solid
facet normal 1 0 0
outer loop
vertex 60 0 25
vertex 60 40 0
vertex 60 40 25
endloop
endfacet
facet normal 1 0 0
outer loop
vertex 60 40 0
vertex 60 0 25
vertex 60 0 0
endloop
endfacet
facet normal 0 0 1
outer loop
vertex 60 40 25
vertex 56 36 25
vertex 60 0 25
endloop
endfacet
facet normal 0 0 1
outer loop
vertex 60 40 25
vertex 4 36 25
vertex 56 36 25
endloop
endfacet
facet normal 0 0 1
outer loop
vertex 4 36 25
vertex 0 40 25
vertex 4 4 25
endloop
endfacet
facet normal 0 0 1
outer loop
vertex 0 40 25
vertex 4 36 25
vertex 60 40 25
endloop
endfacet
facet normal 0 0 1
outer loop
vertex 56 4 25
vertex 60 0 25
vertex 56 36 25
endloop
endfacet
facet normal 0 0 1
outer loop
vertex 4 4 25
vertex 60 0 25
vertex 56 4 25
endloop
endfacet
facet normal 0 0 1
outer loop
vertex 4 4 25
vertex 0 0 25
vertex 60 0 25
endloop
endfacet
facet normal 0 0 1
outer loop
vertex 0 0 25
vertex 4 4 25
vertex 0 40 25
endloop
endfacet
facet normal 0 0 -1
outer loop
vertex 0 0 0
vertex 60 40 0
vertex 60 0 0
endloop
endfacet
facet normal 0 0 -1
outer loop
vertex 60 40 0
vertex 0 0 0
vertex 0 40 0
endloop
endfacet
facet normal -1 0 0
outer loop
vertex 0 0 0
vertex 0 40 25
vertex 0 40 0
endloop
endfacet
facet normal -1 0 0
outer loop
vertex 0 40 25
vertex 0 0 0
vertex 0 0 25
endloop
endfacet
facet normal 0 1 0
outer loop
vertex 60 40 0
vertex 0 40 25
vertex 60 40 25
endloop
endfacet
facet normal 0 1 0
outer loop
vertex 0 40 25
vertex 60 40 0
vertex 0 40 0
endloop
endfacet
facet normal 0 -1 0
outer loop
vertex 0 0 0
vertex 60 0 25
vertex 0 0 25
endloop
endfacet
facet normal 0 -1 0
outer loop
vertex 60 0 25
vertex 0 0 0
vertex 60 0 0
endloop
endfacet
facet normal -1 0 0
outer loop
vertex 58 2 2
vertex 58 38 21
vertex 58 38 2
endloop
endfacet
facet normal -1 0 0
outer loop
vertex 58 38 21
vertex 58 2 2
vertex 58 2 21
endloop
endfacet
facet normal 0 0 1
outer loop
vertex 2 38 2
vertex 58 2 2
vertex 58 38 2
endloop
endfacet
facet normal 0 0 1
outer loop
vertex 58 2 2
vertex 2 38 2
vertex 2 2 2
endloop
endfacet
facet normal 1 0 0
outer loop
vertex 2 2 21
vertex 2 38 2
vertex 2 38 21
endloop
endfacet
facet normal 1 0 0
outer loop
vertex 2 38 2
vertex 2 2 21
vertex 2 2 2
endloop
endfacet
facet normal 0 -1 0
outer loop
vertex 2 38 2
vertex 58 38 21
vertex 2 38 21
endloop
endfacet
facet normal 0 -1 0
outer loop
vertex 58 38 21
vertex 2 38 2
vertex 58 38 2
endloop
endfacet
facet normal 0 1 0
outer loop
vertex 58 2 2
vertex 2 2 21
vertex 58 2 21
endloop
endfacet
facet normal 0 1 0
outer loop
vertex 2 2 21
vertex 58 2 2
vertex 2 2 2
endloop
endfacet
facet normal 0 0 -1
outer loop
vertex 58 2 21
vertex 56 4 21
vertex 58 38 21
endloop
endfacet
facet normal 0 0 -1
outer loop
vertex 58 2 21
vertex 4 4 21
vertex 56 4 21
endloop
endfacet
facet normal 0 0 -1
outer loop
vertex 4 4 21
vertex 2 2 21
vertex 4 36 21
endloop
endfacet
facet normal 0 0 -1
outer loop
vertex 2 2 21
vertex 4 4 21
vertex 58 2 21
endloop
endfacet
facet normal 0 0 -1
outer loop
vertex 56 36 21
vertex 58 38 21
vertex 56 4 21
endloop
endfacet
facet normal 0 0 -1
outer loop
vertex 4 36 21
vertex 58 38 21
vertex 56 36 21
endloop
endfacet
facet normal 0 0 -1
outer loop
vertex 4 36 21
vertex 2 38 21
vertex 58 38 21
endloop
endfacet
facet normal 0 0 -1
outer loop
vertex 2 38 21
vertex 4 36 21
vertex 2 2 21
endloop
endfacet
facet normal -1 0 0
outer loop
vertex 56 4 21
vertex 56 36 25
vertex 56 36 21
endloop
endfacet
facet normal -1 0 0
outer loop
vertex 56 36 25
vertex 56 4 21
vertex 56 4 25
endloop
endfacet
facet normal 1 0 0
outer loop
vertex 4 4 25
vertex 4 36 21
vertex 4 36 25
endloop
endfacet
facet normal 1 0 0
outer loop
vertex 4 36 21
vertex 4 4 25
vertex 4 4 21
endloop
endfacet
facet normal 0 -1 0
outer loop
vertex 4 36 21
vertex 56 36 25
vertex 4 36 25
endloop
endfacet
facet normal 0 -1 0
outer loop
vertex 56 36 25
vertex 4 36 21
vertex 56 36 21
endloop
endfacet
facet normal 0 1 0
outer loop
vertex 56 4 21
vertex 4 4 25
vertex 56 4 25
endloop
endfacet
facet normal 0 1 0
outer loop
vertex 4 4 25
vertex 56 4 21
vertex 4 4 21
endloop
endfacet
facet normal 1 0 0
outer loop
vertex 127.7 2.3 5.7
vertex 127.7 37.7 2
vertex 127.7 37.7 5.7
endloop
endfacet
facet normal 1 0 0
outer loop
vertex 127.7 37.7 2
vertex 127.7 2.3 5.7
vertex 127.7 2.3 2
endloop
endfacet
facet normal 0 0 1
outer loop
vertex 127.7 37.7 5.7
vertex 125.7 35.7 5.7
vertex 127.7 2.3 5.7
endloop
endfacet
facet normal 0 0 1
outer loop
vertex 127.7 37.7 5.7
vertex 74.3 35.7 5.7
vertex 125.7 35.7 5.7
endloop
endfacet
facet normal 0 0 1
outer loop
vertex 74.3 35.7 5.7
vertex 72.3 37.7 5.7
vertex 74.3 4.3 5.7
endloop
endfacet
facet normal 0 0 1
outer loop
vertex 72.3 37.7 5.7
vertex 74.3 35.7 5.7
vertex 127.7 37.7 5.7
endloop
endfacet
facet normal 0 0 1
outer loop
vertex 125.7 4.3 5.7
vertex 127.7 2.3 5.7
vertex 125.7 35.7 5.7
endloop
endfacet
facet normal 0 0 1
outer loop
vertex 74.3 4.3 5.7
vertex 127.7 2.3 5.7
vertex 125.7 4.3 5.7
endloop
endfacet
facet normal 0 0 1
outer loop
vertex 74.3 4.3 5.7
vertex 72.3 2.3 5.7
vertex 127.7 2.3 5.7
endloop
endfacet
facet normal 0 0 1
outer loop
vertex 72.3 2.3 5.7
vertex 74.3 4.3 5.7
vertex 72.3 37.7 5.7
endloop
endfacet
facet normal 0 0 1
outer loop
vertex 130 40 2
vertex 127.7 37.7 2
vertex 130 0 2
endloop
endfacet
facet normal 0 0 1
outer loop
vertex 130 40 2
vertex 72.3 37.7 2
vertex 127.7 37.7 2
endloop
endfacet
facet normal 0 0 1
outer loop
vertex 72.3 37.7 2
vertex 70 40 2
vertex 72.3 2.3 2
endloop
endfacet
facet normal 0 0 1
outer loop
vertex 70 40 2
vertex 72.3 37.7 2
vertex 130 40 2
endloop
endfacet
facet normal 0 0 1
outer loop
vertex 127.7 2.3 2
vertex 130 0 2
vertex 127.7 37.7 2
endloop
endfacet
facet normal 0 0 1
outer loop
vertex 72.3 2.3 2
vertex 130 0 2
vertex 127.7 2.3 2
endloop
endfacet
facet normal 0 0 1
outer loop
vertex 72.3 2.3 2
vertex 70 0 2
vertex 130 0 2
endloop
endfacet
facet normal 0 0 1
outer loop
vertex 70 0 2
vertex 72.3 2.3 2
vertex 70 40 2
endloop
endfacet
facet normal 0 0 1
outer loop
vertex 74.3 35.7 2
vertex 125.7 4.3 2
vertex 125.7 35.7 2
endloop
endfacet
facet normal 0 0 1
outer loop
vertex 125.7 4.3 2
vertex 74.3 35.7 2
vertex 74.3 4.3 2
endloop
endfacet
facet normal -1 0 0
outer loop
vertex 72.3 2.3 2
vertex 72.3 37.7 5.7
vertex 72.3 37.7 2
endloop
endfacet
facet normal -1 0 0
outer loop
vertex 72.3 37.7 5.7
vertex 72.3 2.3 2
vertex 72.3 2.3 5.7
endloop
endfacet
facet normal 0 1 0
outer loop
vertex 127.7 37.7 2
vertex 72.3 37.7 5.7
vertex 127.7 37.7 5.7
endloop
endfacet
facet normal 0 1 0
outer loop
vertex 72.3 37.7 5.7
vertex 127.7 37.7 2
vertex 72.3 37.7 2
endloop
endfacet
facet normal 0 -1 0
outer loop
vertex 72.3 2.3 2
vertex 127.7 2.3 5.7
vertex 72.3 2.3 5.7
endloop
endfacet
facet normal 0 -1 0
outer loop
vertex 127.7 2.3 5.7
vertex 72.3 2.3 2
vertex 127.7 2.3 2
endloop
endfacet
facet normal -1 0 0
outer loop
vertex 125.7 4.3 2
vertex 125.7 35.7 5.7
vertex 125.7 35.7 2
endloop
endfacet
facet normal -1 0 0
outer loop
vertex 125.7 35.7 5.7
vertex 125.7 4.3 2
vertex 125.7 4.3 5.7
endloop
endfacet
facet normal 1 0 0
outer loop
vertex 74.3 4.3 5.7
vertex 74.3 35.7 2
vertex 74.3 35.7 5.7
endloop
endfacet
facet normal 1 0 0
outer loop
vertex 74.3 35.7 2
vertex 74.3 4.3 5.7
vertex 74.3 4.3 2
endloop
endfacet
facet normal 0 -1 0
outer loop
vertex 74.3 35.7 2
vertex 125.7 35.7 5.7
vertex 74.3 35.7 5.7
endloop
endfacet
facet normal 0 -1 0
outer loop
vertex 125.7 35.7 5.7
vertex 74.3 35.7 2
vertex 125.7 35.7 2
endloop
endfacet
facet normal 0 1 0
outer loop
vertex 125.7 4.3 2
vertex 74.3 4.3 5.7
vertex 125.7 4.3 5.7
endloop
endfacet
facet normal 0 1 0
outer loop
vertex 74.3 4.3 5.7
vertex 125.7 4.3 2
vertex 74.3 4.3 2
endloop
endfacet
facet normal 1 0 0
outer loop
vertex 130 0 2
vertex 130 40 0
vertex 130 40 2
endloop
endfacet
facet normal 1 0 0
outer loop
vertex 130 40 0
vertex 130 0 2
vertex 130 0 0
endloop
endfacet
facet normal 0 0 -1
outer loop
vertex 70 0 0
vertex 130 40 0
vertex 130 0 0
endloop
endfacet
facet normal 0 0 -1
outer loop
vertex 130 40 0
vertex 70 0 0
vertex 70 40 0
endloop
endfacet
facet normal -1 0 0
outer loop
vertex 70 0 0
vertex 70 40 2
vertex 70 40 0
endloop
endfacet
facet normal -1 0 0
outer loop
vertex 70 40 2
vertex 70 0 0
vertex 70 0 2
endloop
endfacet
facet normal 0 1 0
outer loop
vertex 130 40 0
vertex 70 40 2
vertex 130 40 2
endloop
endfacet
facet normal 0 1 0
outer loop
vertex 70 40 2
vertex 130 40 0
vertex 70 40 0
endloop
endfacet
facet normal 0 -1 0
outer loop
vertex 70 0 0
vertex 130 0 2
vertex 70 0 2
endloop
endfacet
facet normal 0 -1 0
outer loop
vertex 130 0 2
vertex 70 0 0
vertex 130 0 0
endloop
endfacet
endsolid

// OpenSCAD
// Parametric box with matching lid
// Includes lip for secure closure and clearance for 3D printing

box_length = 60;
box_width = 40;
box_height = 25;
wall_thickness = 2;
lip_height = 4;
lip_clearance = 0.3;  // Tolerance for 3D printing fit

module box_base() {
    difference() {
        // Outer shell
        cube([box_length, box_width, box_height]);
        
        // Inner cavity
        translate([wall_thickness, wall_thickness, wall_thickness])
        cube([
            box_length - 2*wall_thickness,
            box_width - 2*wall_thickness,
            box_height
        ]);
    }
    
    // Inner lip for lid to sit on
    difference() {
        translate([wall_thickness, wall_thickness, box_height - lip_height])
        cube([
            box_length - 2*wall_thickness,
            box_width - 2*wall_thickness,
            lip_height
        ]);
        
        translate([wall_thickness*2, wall_thickness*2, box_height - lip_height])
        cube([
            box_length - 4*wall_thickness,
            box_width - 4*wall_thickness,
            lip_height + 1
        ]);
    }
}

module box_lid() {
    lid_inner_width = box_length - 2*wall_thickness - lip_clearance*2;
    lid_inner_depth = box_width - 2*wall_thickness - lip_clearance*2;
    
    // Lid top
    cube([box_length, box_width, wall_thickness]);
    
    // Lid lip that fits inside box
    translate([wall_thickness + lip_clearance, wall_thickness + lip_clearance, wall_thickness])
    difference() {
        cube([lid_inner_width, lid_inner_depth, lip_height - lip_clearance]);
        
        translate([wall_thickness, wall_thickness, -1])
        cube([
            lid_inner_width - 2*wall_thickness,
            lid_inner_depth - 2*wall_thickness,
            lip_height + 2
        ]);
    }
}

// Display box and lid side by side
box_base();
translate([box_length + 10, 0, 0])
box_lid();
